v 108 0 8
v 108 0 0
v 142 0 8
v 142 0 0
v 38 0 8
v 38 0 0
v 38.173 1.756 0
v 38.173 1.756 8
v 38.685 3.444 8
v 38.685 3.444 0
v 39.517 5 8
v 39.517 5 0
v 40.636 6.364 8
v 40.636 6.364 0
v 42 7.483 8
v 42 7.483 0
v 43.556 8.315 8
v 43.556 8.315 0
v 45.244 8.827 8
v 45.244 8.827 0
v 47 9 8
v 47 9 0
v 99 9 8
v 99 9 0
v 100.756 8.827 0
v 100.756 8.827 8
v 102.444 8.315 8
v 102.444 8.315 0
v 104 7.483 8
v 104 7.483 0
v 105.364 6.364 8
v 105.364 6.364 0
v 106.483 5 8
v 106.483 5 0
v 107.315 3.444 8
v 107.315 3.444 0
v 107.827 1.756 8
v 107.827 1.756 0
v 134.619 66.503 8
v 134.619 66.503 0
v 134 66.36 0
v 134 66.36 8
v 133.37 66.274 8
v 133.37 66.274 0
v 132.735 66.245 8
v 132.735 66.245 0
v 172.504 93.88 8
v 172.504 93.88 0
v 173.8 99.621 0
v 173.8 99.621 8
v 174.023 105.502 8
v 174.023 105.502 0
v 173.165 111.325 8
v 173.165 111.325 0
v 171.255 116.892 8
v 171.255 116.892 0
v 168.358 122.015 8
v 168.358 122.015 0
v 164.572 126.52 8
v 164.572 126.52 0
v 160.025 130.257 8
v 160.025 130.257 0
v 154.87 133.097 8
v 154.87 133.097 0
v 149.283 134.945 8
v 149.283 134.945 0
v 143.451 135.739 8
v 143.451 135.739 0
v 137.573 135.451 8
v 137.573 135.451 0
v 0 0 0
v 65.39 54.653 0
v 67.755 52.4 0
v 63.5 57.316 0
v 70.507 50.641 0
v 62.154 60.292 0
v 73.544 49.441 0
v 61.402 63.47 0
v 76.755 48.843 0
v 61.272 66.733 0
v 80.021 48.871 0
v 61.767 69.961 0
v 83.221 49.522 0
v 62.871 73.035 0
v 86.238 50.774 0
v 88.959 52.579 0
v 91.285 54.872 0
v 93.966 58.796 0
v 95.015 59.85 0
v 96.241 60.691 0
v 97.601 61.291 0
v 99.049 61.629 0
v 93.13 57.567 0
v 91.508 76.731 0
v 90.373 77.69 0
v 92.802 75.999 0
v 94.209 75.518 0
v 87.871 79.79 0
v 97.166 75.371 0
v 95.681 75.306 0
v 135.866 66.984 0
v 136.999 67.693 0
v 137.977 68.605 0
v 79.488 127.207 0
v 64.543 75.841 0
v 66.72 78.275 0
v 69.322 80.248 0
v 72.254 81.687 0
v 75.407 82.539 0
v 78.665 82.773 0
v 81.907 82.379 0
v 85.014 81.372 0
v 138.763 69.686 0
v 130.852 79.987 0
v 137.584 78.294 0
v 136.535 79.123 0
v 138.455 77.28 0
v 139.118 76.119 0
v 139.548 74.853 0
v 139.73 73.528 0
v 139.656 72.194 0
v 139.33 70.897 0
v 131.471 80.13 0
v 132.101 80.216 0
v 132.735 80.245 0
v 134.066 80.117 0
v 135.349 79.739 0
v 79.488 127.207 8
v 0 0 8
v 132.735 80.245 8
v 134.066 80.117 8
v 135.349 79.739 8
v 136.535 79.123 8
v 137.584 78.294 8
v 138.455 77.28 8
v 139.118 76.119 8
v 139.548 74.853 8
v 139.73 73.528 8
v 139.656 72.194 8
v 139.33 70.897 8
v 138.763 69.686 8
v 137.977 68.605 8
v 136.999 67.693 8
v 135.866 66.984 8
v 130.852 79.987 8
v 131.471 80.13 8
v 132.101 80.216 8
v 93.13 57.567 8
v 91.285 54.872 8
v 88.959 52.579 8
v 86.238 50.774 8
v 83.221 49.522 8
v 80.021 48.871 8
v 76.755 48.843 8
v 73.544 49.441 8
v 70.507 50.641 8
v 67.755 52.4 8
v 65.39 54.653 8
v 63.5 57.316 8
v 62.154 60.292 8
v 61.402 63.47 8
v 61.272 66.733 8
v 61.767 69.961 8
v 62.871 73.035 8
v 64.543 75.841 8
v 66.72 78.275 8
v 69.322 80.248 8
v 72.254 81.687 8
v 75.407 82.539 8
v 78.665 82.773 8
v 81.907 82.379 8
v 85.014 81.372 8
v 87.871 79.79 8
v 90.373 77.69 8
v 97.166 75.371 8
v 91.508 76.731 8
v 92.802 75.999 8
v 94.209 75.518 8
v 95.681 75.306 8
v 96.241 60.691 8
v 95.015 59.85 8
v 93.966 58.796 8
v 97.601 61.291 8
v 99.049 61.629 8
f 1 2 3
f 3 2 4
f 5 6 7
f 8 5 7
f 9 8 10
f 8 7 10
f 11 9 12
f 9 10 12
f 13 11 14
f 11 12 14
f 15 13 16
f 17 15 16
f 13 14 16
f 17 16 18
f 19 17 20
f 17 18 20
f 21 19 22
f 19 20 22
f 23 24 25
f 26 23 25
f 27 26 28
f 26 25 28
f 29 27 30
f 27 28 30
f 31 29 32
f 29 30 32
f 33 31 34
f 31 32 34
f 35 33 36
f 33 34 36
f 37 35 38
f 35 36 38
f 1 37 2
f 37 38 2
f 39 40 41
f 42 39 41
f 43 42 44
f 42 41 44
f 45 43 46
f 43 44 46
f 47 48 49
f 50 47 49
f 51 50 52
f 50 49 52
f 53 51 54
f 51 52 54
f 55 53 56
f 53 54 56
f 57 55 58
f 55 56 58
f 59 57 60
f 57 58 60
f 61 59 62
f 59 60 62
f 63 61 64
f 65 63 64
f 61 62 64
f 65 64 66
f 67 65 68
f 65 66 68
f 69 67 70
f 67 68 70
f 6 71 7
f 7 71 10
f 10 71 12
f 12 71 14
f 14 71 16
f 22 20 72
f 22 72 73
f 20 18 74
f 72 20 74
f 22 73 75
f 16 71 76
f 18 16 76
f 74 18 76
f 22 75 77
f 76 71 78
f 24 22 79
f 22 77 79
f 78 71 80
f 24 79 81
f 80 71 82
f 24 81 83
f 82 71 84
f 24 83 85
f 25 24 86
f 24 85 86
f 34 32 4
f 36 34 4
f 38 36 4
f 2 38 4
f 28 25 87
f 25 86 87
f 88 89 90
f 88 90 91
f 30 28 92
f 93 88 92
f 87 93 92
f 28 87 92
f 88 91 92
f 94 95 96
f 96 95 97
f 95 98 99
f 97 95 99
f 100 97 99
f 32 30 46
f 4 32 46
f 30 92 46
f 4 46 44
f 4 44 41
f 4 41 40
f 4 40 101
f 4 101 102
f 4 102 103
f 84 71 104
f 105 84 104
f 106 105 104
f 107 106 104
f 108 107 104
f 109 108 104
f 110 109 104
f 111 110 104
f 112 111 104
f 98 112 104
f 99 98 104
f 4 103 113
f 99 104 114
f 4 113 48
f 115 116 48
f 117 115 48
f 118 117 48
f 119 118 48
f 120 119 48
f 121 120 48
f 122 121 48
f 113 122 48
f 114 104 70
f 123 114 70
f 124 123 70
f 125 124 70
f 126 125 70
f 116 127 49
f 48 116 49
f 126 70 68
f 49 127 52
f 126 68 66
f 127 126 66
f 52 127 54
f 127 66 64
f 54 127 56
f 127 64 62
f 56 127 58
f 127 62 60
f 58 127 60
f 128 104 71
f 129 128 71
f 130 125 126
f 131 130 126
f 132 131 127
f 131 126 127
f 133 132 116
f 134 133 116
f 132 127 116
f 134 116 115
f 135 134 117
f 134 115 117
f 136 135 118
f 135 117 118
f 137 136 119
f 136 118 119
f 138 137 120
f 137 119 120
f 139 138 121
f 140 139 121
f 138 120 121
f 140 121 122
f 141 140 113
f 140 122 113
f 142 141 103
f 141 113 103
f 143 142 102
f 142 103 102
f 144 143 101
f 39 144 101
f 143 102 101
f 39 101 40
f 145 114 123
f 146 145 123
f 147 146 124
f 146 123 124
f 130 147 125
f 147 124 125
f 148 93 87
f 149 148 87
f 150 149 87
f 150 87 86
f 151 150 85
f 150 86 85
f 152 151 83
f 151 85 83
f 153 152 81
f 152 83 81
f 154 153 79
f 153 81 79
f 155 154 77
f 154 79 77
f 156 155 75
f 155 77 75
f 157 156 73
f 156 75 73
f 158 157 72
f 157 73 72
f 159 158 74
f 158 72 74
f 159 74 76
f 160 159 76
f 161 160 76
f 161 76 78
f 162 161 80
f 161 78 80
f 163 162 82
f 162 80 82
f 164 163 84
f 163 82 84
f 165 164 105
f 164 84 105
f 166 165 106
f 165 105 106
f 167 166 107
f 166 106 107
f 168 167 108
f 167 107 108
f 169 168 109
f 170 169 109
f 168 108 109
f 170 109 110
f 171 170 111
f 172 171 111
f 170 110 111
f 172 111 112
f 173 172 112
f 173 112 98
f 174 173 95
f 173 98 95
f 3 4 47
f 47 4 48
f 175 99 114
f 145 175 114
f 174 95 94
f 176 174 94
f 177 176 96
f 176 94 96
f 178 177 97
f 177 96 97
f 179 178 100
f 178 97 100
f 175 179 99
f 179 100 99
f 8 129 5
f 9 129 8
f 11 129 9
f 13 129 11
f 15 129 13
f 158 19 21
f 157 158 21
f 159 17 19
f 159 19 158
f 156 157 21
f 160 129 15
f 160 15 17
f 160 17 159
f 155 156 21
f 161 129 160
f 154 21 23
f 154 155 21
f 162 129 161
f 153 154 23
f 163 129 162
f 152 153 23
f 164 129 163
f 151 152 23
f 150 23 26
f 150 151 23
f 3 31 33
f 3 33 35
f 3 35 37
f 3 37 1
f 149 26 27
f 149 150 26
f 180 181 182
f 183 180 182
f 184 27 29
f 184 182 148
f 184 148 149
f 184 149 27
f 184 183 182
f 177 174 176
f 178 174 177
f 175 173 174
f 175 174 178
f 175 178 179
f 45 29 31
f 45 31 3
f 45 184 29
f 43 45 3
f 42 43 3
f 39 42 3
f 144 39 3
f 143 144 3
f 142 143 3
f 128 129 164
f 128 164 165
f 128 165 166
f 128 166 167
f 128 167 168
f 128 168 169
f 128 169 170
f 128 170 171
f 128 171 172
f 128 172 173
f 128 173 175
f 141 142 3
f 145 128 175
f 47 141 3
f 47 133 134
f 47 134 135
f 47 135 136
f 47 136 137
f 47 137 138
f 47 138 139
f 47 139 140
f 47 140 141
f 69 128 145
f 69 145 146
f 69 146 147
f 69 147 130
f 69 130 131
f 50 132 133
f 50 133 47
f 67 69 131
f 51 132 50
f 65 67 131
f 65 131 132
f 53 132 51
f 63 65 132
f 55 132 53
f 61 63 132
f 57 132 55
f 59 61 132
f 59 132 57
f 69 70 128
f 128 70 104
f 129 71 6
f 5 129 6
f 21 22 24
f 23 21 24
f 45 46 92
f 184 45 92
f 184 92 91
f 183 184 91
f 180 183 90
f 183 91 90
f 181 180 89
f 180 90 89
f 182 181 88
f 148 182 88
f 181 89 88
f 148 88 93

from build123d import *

# Parameters (mm, degrees)
BOSS_EXTRUDE1_DEPTH = 8


with BuildPart() as part:
    # Sketch1 → Boss-Extrude1 (new body)
    with BuildSketch(Plane.XY):
        with BuildLine():
            Line((79.487889635, 127.207214423), (0, 0))
            Line((0, 0), (38, 0))
            ThreePointArc((38, 0), (40.636038969, 6.363961031), (47, 9))
            Line((47, 9), (99, 9))
            ThreePointArc((99, 9), (105.363961031, 6.363961031), (108, 0))
            Line((108, 0), (142, 0))
            Line((142, 0), (172.50354814, 93.880267937))
            ThreePointArc((172.50354814, 93.880267937), (166.569139078, 124.354715336), (137.573015724, 135.451290736))
            Line((137.573015724, 135.451290736), (79.487889635, 127.207214423))
        make_face()
        with BuildLine():
            ThreePointArc((130.852326035, 79.986711388), (131.785075785, 80.179945877), (132.735423682, 80.244757424))
            ThreePointArc((132.735423682, 80.244757424), (139.670612135, 74.195105322), (134.61852133, 66.50280346))
            ThreePointArc((134.61852133, 66.50280346), (133.68577158, 66.309568971), (132.735423682, 66.244757424))
            Line((132.735423682, 66.244757424), (99.049026675, 61.628618036))
            ThreePointArc((99.049026675, 61.628618036), (95.608426443, 60.298814317), (93.130184546, 57.566704329))
            ThreePointArc((93.130184546, 57.566704329), (61.402056741, 63.469750476), (90.372565984, 77.690497362))
            ThreePointArc((90.372565984, 77.690497362), (93.494426366, 75.725784751), (97.165929028, 75.370572))
            Line((97.165929028, 75.370572), (130.852326035, 79.986711388))
        make_face(mode=Mode.SUBTRACT)
    extrude(amount=BOSS_EXTRUDE1_DEPTH)


solid = part.part
